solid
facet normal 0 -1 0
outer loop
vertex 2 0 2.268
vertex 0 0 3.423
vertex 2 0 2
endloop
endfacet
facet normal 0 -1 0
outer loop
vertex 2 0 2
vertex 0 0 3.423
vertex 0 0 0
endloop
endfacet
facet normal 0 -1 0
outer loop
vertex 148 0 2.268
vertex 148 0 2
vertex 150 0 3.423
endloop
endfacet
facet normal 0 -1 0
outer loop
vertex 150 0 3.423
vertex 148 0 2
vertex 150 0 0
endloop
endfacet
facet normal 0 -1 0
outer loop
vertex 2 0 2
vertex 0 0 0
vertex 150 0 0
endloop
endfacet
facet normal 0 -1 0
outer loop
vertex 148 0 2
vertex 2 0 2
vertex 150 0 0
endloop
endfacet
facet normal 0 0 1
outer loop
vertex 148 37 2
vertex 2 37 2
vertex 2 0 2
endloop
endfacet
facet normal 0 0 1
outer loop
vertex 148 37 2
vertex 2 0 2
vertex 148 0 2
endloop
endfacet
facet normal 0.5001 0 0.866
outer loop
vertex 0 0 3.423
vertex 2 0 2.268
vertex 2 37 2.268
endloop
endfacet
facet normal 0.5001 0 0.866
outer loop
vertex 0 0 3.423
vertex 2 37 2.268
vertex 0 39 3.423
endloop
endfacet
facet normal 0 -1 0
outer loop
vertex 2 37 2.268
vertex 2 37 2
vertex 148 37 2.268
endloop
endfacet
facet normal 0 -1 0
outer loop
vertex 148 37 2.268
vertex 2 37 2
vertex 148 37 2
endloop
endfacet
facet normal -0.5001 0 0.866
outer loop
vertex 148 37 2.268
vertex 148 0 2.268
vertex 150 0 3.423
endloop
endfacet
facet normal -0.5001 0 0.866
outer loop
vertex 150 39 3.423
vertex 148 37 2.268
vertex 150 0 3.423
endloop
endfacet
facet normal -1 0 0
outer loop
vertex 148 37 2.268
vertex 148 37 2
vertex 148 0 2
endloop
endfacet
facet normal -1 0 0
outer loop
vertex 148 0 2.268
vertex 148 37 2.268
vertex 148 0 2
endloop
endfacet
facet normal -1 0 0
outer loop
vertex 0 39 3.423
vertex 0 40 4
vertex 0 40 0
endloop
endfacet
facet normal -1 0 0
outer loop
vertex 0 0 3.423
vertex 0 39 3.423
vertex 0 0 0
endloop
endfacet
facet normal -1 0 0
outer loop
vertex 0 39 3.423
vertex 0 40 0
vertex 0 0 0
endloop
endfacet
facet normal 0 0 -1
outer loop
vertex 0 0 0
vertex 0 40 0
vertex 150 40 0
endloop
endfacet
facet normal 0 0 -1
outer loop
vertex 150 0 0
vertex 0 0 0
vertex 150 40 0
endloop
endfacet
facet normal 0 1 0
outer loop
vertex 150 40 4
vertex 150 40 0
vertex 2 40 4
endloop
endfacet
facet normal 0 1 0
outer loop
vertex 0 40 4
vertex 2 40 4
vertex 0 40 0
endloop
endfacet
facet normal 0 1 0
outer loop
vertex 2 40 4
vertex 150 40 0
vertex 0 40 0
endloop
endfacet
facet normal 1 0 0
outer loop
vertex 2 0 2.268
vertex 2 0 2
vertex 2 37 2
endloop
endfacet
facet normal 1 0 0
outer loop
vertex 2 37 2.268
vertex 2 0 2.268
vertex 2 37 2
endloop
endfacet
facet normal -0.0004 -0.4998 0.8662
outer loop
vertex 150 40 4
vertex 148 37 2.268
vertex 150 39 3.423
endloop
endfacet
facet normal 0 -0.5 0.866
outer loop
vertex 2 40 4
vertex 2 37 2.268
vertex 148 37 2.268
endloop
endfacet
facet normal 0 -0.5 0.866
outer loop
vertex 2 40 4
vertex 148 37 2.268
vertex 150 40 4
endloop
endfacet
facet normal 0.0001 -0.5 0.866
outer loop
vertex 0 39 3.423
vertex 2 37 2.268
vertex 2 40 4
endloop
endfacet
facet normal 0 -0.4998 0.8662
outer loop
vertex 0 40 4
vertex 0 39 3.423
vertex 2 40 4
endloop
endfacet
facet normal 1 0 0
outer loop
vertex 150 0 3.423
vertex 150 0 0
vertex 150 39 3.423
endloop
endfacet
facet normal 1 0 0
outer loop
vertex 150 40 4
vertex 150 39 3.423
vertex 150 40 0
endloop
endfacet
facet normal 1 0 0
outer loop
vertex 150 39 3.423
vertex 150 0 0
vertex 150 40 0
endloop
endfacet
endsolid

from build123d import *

# Parameters (mm, degrees)
SKETCH1_W           = 146
SKETCH1_H           = 37
BOSS_EXTRUDE1_DEPTH = 2
BOSS_EXTRUDE2_DEPTH = 4


with BuildPart() as part:
    # Sketch1 → Boss-Extrude1 (new body)
    with BuildSketch(Plane.XY):
        with Locations((75, 18.5)):
            Rectangle(SKETCH1_W, SKETCH1_H)
    extrude(amount=BOSS_EXTRUDE1_DEPTH)

    # Sketch1<4> → Boss-Extrude2 (add)
    with BuildSketch(Plane.XY):
        Polygon((2, 0), (2, 37), (148, 37), (148, 0), (150, 0), (150, 40), (0, 40), (0, 0), align=None)
    extrude(amount=BOSS_EXTRUDE2_DEPTH)

    # Chamfer1
    # the kernel refuses this chamfer: 3, 1.732050808 mm, written as the material it takes off along each edge
    with BuildSketch(Plane(origin=(148, 37, 4), x_dir=(-0.05789386240267211, 0, -0.9983227437537925), z_dir=(0, -1, 0)), Plane(origin=(2, 0, 4), x_dir=(0.05789386240267088, 0, -0.9983227437537927), z_dir=(0, 1, 0))) as chamfer1_piece_1:
        with BuildLine():
            Line((1.795061586, 0), (-0.239597459, 3.095243342))
            Line((-0.239597459, 3.095243342), (-0.299496823, 3.091769711))
            ThreePointArc((-0.299496823, 3.091769711), (-0.149748412, 1.545884855), (-0.059899365, -0.003473632))
            Line((-0.059899365, -0.003473632), (0.003473632, -0.059899365))
            ThreePointArc((0.003473632, -0.059899365), (0.897996171, -0.008024993), (1.798535218, -0.059899365))
            Line((1.798535218, -0.059899365), (1.795061586, 0))
        make_face()
    extrude(amount=37, mode=Mode.SUBTRACT)
    with BuildSketch(Plane(origin=(2, 37, 4), x_dir=(0, -0.05789386240267211, -0.9983227437537925), z_dir=(1, 0, 0))) as chamfer1_piece_2:
        with BuildLine():
            Line((1.795061586, 0), (-0.239597459, 3.095243342))
            Line((-0.239597459, 3.095243342), (-0.299496823, 3.091769711))
            ThreePointArc((-0.299496823, 3.091769711), (-0.149748412, 1.545884855), (-0.059899365, -0.003473632))
            Line((-0.059899365, -0.003473632), (0.003473632, -0.059899365))
            ThreePointArc((0.003473632, -0.059899365), (0.897996171, -0.008024993), (1.798535218, -0.059899365))
            Line((1.798535218, -0.059899365), (1.795061586, 0))
        make_face()
    extrude(amount=146, mode=Mode.SUBTRACT)
    with BuildSketch(Plane(origin=(148, 44.761257264, 4), x_dir=(-0.05789386240267211, 0, -0.9983227437537925), z_dir=(0, -1, 0))) as chamfer1_piece_3a_section:
        with BuildLine():
            Line((1.795061586, 0), (-0.239597459, 3.095243342))
            Line((-0.239597459, 3.095243342), (-0.299496823, 3.091769711))
            ThreePointArc((-0.299496823, 3.091769711), (-0.149748412, 1.545884855), (-0.059899365, -0.003473632))
            Line((-0.059899365, -0.003473632), (0.003473632, -0.059899365))
            ThreePointArc((0.003473632, -0.059899365), (0.897996171, -0.008024993), (1.798535218, -0.059899365))
            Line((1.798535218, -0.059899365), (1.795061586, 0))
        make_face()
    chamfer1_piece_3a = extrude(amount=44.761257264, mode=Mode.PRIVATE)
    chamfer1_piece_3a = split(chamfer1_piece_3a, bisect_by=Plane(origin=(149.006146815, 37, 3.444583449), z_dir=(0, 1, 0)), keep=Keep.TOP, mode=Mode.PRIVATE)
    with BuildSketch(Plane(origin=(2, 37, 4), x_dir=(0, -0.05789386240267211, -0.9983227437537925), z_dir=(1, 0, 0))) as chamfer1_piece_3b_section:
        with BuildLine():
            Line((1.795061586, 0), (-0.239597459, 3.095243342))
            Line((-0.239597459, 3.095243342), (-0.299496823, 3.091769711))
            ThreePointArc((-0.299496823, 3.091769711), (-0.149748412, 1.545884855), (-0.059899365, -0.003473632))
            Line((-0.059899365, -0.003473632), (0.003473632, -0.059899365))
            ThreePointArc((0.003473632, -0.059899365), (0.897996171, -0.008024993), (1.798535218, -0.059899365))
            Line((1.798535218, -0.059899365), (1.795061586, 0))
        make_face()
    chamfer1_piece_3b = extrude(amount=153.761257264, mode=Mode.PRIVATE)
    chamfer1_piece_3b = split(chamfer1_piece_3b, bisect_by=Plane(origin=(148, 38.006146815, 3.444583449), z_dir=(1, 0, 0)), keep=Keep.TOP, mode=Mode.PRIVATE)
    chamfer1_piece_3 = chamfer1_piece_3a & chamfer1_piece_3b
    add(chamfer1_piece_3, mode=Mode.SUBTRACT)
    with BuildSketch(Plane(origin=(-5.761257264, 37, 4), x_dir=(0, -0.05789386240267211, -0.9983227437537925), z_dir=(1, 0, 0))) as chamfer1_piece_4a_section:
        with BuildLine():
            Line((1.795061586, 0), (-0.239597459, 3.095243342))
            Line((-0.239597459, 3.095243342), (-0.299496823, 3.091769711))
            ThreePointArc((-0.299496823, 3.091769711), (-0.149748412, 1.545884855), (-0.059899365, -0.003473632))
            Line((-0.059899365, -0.003473632), (0.003473632, -0.059899365))
            ThreePointArc((0.003473632, -0.059899365), (0.897996171, -0.008024993), (1.798535218, -0.059899365))
            Line((1.798535218, -0.059899365), (1.795061586, 0))
        make_face()
    chamfer1_piece_4a = extrude(amount=153.761257264, mode=Mode.PRIVATE)
    chamfer1_piece_4a = split(chamfer1_piece_4a, bisect_by=Plane(origin=(2, 38.006146815, 3.444583449), z_dir=(-1, 0, 0)), keep=Keep.TOP, mode=Mode.PRIVATE)
    with BuildSketch(Plane(origin=(2, 0, 4), x_dir=(0.05789386240267088, 0, -0.9983227437537927), z_dir=(0, 1, 0))) as chamfer1_piece_4b_section:
        with BuildLine():
            Line((1.795061586, 0), (-0.239597459, 3.095243342))
            Line((-0.239597459, 3.095243342), (-0.299496823, 3.091769711))
            ThreePointArc((-0.299496823, 3.091769711), (-0.149748412, 1.545884855), (-0.059899365, -0.003473632))
            Line((-0.059899365, -0.003473632), (0.003473632, -0.059899365))
            ThreePointArc((0.003473632, -0.059899365), (0.897996171, -0.008024993), (1.798535218, -0.059899365))
            Line((1.798535218, -0.059899365), (1.795061586, 0))
        make_face()
    chamfer1_piece_4b = extrude(amount=44.761257264, mode=Mode.PRIVATE)
    chamfer1_piece_4b = split(chamfer1_piece_4b, bisect_by=Plane(origin=(0.993853185, 37, 3.444583449), z_dir=(0, 1, 0)), keep=Keep.TOP, mode=Mode.PRIVATE)
    chamfer1_piece_4 = chamfer1_piece_4a & chamfer1_piece_4b
    add(chamfer1_piece_4, mode=Mode.SUBTRACT)


solid = part.part
